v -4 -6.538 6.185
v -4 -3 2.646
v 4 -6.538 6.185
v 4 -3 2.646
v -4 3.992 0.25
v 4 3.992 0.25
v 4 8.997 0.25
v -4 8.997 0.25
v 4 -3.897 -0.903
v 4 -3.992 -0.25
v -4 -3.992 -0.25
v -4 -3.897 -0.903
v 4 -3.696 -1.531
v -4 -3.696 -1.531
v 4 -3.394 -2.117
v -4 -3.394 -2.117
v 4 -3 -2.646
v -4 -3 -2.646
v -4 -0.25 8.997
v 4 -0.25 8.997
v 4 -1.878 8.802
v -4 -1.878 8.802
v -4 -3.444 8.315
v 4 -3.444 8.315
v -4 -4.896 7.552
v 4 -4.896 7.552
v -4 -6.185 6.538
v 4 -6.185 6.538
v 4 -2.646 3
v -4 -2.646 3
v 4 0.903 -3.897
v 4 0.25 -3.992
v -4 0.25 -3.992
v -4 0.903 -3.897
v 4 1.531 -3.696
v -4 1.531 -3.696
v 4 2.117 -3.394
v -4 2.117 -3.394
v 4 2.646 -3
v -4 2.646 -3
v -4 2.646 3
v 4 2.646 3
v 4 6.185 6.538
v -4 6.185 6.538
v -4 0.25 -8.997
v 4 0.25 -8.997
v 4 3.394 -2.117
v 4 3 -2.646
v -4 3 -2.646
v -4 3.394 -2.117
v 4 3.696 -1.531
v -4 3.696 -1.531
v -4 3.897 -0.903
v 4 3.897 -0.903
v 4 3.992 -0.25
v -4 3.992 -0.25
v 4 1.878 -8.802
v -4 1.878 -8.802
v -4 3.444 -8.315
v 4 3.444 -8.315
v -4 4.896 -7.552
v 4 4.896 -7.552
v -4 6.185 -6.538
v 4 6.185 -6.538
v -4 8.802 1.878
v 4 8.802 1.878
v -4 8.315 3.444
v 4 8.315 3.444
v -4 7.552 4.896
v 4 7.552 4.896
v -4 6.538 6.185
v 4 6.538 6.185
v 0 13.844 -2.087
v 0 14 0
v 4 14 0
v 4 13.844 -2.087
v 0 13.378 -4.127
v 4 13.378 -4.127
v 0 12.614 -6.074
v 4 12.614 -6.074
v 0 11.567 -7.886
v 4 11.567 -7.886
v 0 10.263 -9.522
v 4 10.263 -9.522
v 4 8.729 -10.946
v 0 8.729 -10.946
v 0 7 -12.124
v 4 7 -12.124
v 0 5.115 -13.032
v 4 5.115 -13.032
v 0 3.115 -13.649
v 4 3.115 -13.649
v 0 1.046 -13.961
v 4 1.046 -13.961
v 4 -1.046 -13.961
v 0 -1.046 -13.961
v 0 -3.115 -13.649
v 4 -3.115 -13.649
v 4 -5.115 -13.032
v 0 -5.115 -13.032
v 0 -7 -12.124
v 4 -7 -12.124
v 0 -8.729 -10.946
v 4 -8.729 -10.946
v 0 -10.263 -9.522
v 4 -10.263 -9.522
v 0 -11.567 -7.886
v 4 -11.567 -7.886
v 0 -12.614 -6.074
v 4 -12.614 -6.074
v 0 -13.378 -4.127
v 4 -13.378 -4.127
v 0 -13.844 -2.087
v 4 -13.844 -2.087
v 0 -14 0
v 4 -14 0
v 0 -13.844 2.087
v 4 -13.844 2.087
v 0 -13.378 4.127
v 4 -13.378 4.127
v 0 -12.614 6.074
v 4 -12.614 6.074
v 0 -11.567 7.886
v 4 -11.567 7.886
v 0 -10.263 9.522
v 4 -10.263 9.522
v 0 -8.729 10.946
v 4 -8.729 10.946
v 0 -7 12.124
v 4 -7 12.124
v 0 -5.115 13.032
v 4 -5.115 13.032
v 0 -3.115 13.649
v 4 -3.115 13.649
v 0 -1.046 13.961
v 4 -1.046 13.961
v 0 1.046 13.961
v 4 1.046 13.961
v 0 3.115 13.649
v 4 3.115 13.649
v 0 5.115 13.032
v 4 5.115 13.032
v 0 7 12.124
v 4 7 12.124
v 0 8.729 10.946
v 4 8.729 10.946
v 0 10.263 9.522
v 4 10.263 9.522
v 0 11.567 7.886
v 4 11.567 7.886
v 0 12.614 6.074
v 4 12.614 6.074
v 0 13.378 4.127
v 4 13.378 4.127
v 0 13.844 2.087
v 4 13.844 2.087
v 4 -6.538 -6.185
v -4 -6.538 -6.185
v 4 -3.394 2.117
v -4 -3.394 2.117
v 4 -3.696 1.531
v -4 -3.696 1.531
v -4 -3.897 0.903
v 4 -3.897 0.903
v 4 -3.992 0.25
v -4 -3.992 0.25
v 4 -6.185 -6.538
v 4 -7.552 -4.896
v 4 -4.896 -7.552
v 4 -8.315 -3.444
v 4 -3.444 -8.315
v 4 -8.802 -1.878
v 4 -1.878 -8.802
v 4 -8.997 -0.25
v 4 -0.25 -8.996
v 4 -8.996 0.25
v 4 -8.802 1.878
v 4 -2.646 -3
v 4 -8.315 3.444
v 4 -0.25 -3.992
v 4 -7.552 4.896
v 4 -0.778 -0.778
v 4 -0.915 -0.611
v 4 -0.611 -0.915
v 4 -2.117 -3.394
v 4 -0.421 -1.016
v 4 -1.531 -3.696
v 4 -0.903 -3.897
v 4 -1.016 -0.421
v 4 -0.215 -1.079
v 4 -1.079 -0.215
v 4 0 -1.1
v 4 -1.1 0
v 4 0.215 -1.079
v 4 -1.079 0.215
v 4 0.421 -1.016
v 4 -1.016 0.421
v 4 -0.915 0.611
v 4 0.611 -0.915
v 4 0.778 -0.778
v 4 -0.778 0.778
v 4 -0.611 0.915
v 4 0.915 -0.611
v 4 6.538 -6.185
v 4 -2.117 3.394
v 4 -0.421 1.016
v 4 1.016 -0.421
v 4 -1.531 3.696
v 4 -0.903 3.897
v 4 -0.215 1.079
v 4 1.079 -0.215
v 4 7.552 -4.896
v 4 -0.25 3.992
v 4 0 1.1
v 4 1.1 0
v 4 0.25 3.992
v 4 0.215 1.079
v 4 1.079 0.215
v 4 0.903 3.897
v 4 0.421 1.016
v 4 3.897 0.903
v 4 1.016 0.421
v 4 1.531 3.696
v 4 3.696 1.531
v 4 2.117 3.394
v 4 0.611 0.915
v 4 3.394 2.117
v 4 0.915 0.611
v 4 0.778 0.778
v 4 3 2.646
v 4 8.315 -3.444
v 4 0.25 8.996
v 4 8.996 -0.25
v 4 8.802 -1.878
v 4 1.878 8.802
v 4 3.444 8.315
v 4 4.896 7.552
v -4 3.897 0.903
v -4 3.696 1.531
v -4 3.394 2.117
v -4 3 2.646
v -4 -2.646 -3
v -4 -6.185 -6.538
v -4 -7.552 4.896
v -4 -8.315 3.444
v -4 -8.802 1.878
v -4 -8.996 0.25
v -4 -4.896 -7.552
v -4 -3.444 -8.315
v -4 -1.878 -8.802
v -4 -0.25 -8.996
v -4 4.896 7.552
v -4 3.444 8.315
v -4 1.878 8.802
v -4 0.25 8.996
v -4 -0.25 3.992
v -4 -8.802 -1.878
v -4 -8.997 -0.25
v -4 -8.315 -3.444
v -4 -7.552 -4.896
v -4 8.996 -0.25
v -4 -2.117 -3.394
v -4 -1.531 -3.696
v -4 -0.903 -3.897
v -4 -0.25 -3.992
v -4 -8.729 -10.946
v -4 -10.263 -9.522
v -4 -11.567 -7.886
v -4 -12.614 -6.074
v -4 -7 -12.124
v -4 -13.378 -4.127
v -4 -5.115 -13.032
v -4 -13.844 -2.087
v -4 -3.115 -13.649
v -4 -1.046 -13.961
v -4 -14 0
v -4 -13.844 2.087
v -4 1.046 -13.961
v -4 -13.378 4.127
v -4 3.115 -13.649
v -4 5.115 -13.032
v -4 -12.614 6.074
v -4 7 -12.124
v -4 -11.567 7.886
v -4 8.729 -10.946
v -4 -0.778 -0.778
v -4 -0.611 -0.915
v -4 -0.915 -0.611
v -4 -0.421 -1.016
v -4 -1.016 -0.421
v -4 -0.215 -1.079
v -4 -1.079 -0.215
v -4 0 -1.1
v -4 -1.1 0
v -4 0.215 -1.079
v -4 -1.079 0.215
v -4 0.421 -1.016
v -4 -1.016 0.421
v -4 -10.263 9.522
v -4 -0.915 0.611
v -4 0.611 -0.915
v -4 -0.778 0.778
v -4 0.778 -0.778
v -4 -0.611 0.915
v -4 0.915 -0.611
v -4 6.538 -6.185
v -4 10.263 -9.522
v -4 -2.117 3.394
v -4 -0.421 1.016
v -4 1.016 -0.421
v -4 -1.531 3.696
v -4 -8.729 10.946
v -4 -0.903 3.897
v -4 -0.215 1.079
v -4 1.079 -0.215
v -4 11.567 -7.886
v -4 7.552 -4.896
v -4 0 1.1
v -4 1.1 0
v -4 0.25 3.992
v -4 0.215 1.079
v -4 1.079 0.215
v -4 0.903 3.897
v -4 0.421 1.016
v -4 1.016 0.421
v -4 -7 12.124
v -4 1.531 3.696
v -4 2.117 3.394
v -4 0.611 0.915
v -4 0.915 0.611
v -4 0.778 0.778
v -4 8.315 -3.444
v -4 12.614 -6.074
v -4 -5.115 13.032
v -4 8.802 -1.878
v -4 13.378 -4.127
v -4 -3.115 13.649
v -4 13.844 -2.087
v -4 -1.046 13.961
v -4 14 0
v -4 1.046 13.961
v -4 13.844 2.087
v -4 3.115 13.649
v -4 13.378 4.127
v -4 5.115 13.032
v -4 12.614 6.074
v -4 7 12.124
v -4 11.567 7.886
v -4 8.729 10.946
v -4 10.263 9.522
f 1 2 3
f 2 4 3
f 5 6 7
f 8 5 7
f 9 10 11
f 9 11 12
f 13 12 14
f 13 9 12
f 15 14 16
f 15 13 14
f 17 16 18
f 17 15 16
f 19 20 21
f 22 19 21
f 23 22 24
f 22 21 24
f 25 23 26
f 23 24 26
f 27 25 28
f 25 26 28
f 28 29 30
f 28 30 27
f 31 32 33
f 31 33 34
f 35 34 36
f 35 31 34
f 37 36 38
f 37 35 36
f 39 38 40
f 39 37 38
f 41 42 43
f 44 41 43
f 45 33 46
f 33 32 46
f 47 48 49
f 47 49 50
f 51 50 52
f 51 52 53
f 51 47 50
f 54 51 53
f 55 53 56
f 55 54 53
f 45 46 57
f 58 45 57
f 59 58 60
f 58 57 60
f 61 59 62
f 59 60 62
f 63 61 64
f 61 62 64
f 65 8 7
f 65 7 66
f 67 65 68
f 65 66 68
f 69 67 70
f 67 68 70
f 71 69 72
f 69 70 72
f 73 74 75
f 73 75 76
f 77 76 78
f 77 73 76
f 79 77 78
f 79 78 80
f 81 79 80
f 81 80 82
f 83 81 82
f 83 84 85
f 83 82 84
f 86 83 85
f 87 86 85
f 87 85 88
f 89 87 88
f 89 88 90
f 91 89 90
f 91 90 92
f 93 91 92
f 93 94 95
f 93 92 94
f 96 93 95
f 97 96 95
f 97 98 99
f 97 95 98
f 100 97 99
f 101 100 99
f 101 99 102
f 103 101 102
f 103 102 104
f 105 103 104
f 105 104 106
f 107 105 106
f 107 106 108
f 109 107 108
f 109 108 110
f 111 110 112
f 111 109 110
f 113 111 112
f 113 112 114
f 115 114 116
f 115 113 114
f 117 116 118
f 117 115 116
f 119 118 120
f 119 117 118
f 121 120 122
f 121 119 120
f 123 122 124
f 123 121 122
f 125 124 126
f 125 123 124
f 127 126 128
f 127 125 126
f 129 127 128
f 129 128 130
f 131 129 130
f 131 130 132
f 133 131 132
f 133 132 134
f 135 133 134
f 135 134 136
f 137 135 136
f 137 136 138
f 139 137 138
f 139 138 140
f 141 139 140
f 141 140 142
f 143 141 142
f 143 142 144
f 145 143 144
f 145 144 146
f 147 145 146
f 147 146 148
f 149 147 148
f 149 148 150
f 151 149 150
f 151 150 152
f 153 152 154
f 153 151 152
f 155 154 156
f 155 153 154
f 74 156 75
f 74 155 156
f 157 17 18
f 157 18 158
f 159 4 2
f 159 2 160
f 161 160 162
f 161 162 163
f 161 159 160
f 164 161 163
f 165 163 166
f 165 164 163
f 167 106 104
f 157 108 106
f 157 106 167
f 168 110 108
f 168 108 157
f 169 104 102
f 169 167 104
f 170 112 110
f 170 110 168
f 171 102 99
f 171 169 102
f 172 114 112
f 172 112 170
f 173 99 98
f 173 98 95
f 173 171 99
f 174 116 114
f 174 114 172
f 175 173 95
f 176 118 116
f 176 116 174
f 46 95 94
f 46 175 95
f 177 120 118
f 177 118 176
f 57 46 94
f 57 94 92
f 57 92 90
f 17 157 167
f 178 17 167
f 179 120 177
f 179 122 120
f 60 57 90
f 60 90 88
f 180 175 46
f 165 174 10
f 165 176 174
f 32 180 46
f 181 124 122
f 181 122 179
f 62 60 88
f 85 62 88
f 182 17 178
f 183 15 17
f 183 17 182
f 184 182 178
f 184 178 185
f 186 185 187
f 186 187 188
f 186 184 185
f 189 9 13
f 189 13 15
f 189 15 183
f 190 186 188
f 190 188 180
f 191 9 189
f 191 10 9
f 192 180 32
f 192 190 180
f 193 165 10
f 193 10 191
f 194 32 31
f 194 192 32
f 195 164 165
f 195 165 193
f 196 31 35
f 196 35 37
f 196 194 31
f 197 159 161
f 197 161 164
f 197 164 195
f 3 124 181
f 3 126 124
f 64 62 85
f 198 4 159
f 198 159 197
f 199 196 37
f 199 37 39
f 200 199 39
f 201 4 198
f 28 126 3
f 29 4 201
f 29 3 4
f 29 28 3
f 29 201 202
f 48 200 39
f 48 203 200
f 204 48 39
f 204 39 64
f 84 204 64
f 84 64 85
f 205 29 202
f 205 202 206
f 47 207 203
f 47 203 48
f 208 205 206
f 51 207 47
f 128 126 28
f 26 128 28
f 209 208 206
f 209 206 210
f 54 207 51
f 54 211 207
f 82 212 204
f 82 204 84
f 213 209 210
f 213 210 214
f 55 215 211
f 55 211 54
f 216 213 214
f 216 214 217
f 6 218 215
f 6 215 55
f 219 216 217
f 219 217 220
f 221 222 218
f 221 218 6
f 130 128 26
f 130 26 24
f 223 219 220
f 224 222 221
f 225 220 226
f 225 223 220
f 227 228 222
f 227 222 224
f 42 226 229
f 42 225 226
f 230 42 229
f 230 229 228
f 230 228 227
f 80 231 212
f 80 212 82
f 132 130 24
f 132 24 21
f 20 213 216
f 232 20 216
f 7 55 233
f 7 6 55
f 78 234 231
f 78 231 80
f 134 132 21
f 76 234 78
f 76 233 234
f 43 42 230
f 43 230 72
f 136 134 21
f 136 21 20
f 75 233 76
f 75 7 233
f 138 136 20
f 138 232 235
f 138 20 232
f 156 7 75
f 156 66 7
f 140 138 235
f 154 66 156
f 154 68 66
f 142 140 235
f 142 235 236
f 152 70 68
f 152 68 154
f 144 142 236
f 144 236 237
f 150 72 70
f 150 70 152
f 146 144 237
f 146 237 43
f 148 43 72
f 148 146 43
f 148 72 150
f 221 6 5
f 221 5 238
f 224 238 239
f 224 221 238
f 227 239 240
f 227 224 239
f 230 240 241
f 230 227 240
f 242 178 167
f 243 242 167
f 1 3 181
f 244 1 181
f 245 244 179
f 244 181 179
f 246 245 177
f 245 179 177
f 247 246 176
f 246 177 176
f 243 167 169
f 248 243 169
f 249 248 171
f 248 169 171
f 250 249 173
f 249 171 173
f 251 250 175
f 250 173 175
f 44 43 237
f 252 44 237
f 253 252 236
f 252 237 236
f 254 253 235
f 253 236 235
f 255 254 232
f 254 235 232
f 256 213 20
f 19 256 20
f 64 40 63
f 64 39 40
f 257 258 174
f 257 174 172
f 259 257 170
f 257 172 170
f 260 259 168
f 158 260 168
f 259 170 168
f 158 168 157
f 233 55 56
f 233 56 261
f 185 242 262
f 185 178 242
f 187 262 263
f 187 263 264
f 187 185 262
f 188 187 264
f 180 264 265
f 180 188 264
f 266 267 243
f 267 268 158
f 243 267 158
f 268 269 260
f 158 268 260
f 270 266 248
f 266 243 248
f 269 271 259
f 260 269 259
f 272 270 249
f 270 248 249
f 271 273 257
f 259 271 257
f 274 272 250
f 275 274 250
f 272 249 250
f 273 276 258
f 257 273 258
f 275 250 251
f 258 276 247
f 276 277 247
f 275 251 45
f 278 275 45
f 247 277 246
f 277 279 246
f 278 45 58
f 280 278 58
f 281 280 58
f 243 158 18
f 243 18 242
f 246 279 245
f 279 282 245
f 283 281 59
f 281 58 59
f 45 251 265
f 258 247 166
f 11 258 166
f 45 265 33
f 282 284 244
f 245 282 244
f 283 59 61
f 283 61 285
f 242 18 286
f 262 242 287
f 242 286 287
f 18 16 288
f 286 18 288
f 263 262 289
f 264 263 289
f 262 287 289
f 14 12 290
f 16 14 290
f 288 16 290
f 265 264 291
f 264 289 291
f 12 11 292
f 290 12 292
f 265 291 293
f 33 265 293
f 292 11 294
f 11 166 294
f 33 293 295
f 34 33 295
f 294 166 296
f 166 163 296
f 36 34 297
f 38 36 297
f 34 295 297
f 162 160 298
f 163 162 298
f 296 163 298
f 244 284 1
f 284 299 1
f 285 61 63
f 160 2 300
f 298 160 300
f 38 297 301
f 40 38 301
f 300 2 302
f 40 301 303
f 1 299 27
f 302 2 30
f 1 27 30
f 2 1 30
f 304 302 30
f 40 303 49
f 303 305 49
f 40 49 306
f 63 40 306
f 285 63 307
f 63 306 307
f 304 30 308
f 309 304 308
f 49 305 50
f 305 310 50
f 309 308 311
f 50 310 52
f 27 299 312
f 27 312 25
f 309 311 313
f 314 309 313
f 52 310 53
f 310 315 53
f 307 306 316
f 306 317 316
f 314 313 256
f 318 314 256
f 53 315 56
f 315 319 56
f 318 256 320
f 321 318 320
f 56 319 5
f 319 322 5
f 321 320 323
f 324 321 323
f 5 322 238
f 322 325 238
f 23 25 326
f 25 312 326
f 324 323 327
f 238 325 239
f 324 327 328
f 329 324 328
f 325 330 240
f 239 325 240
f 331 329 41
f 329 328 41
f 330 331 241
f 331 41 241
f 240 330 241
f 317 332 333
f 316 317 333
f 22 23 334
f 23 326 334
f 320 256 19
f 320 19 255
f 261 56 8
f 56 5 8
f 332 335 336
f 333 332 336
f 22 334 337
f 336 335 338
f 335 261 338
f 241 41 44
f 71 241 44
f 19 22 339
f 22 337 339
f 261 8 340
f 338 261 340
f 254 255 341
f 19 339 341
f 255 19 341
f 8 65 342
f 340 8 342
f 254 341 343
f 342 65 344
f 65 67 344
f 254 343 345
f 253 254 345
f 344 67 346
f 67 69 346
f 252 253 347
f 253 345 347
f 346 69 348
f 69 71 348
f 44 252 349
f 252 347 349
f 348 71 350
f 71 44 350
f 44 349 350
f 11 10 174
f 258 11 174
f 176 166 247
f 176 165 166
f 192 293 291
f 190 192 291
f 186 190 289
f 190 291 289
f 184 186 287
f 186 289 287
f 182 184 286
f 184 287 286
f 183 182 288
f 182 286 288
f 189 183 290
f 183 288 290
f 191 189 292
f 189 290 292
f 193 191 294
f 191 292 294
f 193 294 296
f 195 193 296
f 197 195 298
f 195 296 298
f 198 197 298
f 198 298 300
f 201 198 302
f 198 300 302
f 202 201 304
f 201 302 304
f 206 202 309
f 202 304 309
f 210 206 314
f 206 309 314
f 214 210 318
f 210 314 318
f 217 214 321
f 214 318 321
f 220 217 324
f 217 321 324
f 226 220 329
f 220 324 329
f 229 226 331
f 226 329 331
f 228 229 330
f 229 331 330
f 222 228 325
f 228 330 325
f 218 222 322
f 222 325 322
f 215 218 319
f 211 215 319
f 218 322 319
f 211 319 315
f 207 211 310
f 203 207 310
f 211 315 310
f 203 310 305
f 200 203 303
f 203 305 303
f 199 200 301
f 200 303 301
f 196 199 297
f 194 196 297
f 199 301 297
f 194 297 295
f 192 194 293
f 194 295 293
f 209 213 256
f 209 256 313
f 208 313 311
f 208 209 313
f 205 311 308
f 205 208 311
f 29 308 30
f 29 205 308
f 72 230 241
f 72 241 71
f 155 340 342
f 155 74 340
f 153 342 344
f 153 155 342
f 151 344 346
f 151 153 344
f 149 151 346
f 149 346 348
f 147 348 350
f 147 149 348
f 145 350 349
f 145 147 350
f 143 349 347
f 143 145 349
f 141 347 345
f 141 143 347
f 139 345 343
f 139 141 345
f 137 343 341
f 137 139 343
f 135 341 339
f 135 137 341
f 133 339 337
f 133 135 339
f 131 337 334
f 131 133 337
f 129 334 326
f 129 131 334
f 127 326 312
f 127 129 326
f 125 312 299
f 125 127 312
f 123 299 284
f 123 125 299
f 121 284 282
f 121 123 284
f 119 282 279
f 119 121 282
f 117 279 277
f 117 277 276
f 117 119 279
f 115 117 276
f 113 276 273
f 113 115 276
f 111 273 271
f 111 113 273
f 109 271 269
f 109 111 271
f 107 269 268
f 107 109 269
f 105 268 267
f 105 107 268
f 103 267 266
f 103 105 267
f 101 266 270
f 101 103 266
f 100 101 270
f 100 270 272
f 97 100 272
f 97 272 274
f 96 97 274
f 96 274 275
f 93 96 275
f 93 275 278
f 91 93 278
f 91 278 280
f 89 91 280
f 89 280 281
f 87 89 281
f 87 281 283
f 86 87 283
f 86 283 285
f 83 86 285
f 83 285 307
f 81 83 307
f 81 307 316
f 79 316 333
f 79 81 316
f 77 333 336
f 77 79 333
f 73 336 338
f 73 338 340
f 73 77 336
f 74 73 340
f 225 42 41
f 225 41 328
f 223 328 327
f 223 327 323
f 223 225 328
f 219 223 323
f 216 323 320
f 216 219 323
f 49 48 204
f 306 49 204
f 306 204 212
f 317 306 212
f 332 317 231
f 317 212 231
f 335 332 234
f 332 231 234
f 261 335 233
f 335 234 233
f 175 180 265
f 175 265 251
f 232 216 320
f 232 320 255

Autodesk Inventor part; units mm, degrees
ref_plane "YZ Plane" through (0, 0, 0) normal (1, 0, 0) x (0, 1, 0)
ref_plane "XZ Plane" through (0, 0, 0) normal (0, 1, 0) x (-1, 0, 0)
ref_plane "XY Plane" through (0, 0, 0) normal (0, 0, 1) x (1, 0, 0)
sketch "スケッチ1" plane through (0, 0, 0) normal (1, 0, 0) x (0, 1, 0)
  circle A0 centre (0, 0) radius 14
  dimension "d0" = 28
extrude "押し出し1" add sketch "スケッチ1" along normal mid plane 8
sketch "スケッチ2" plane through (4, 0, 0) normal (1, 0, 0) x (0, 0, -1)
  circle A0 centre (0, 0) radius 14 projected
  circle A1 centre (0, 0) radius 4
  circle A2 centre (0, 0) radius 9
  line L0 (0.25, 3.9922) -> (0.25, 8.9965)
  line L1 (-0.25, 3.9922) -> (-0.25, 8.9965)
  line L2 (2.6461, 2.9997) -> (6.1847, 6.5383)
  line L3 (2.9997, 2.6461) -> (6.5383, 6.1847)
  point P0 (-0.25, 6.4944)
  point P1 (0.25, 6.4944)
  dimension "d3" = 8
  dimension "d4" = 18
  dimension "d5" = 0.5
  dimension "d6" = 0.5
  dimension "d7" = 45
extrude "押し出し2" cut sketch "スケッチ2" against normal through all contours A1 L0 A2 L2
pattern_circular "円形状パターン1" count 8 over 360 about axis through (0, 0, 0) along (1, 0, 0) of "押し出し2"
sketch "スケッチ3" plane through (4, 0, 0) normal (1, 0, 0) x (0, 0, -1)
  circle A0 centre (0, 0) radius 14 projected
hole "穴1" at (4, 0, 0) direction (-1, 0, 0) diameter 2.2 end through all
equation "\"d6\" = d5"
properties part number "wheel"
